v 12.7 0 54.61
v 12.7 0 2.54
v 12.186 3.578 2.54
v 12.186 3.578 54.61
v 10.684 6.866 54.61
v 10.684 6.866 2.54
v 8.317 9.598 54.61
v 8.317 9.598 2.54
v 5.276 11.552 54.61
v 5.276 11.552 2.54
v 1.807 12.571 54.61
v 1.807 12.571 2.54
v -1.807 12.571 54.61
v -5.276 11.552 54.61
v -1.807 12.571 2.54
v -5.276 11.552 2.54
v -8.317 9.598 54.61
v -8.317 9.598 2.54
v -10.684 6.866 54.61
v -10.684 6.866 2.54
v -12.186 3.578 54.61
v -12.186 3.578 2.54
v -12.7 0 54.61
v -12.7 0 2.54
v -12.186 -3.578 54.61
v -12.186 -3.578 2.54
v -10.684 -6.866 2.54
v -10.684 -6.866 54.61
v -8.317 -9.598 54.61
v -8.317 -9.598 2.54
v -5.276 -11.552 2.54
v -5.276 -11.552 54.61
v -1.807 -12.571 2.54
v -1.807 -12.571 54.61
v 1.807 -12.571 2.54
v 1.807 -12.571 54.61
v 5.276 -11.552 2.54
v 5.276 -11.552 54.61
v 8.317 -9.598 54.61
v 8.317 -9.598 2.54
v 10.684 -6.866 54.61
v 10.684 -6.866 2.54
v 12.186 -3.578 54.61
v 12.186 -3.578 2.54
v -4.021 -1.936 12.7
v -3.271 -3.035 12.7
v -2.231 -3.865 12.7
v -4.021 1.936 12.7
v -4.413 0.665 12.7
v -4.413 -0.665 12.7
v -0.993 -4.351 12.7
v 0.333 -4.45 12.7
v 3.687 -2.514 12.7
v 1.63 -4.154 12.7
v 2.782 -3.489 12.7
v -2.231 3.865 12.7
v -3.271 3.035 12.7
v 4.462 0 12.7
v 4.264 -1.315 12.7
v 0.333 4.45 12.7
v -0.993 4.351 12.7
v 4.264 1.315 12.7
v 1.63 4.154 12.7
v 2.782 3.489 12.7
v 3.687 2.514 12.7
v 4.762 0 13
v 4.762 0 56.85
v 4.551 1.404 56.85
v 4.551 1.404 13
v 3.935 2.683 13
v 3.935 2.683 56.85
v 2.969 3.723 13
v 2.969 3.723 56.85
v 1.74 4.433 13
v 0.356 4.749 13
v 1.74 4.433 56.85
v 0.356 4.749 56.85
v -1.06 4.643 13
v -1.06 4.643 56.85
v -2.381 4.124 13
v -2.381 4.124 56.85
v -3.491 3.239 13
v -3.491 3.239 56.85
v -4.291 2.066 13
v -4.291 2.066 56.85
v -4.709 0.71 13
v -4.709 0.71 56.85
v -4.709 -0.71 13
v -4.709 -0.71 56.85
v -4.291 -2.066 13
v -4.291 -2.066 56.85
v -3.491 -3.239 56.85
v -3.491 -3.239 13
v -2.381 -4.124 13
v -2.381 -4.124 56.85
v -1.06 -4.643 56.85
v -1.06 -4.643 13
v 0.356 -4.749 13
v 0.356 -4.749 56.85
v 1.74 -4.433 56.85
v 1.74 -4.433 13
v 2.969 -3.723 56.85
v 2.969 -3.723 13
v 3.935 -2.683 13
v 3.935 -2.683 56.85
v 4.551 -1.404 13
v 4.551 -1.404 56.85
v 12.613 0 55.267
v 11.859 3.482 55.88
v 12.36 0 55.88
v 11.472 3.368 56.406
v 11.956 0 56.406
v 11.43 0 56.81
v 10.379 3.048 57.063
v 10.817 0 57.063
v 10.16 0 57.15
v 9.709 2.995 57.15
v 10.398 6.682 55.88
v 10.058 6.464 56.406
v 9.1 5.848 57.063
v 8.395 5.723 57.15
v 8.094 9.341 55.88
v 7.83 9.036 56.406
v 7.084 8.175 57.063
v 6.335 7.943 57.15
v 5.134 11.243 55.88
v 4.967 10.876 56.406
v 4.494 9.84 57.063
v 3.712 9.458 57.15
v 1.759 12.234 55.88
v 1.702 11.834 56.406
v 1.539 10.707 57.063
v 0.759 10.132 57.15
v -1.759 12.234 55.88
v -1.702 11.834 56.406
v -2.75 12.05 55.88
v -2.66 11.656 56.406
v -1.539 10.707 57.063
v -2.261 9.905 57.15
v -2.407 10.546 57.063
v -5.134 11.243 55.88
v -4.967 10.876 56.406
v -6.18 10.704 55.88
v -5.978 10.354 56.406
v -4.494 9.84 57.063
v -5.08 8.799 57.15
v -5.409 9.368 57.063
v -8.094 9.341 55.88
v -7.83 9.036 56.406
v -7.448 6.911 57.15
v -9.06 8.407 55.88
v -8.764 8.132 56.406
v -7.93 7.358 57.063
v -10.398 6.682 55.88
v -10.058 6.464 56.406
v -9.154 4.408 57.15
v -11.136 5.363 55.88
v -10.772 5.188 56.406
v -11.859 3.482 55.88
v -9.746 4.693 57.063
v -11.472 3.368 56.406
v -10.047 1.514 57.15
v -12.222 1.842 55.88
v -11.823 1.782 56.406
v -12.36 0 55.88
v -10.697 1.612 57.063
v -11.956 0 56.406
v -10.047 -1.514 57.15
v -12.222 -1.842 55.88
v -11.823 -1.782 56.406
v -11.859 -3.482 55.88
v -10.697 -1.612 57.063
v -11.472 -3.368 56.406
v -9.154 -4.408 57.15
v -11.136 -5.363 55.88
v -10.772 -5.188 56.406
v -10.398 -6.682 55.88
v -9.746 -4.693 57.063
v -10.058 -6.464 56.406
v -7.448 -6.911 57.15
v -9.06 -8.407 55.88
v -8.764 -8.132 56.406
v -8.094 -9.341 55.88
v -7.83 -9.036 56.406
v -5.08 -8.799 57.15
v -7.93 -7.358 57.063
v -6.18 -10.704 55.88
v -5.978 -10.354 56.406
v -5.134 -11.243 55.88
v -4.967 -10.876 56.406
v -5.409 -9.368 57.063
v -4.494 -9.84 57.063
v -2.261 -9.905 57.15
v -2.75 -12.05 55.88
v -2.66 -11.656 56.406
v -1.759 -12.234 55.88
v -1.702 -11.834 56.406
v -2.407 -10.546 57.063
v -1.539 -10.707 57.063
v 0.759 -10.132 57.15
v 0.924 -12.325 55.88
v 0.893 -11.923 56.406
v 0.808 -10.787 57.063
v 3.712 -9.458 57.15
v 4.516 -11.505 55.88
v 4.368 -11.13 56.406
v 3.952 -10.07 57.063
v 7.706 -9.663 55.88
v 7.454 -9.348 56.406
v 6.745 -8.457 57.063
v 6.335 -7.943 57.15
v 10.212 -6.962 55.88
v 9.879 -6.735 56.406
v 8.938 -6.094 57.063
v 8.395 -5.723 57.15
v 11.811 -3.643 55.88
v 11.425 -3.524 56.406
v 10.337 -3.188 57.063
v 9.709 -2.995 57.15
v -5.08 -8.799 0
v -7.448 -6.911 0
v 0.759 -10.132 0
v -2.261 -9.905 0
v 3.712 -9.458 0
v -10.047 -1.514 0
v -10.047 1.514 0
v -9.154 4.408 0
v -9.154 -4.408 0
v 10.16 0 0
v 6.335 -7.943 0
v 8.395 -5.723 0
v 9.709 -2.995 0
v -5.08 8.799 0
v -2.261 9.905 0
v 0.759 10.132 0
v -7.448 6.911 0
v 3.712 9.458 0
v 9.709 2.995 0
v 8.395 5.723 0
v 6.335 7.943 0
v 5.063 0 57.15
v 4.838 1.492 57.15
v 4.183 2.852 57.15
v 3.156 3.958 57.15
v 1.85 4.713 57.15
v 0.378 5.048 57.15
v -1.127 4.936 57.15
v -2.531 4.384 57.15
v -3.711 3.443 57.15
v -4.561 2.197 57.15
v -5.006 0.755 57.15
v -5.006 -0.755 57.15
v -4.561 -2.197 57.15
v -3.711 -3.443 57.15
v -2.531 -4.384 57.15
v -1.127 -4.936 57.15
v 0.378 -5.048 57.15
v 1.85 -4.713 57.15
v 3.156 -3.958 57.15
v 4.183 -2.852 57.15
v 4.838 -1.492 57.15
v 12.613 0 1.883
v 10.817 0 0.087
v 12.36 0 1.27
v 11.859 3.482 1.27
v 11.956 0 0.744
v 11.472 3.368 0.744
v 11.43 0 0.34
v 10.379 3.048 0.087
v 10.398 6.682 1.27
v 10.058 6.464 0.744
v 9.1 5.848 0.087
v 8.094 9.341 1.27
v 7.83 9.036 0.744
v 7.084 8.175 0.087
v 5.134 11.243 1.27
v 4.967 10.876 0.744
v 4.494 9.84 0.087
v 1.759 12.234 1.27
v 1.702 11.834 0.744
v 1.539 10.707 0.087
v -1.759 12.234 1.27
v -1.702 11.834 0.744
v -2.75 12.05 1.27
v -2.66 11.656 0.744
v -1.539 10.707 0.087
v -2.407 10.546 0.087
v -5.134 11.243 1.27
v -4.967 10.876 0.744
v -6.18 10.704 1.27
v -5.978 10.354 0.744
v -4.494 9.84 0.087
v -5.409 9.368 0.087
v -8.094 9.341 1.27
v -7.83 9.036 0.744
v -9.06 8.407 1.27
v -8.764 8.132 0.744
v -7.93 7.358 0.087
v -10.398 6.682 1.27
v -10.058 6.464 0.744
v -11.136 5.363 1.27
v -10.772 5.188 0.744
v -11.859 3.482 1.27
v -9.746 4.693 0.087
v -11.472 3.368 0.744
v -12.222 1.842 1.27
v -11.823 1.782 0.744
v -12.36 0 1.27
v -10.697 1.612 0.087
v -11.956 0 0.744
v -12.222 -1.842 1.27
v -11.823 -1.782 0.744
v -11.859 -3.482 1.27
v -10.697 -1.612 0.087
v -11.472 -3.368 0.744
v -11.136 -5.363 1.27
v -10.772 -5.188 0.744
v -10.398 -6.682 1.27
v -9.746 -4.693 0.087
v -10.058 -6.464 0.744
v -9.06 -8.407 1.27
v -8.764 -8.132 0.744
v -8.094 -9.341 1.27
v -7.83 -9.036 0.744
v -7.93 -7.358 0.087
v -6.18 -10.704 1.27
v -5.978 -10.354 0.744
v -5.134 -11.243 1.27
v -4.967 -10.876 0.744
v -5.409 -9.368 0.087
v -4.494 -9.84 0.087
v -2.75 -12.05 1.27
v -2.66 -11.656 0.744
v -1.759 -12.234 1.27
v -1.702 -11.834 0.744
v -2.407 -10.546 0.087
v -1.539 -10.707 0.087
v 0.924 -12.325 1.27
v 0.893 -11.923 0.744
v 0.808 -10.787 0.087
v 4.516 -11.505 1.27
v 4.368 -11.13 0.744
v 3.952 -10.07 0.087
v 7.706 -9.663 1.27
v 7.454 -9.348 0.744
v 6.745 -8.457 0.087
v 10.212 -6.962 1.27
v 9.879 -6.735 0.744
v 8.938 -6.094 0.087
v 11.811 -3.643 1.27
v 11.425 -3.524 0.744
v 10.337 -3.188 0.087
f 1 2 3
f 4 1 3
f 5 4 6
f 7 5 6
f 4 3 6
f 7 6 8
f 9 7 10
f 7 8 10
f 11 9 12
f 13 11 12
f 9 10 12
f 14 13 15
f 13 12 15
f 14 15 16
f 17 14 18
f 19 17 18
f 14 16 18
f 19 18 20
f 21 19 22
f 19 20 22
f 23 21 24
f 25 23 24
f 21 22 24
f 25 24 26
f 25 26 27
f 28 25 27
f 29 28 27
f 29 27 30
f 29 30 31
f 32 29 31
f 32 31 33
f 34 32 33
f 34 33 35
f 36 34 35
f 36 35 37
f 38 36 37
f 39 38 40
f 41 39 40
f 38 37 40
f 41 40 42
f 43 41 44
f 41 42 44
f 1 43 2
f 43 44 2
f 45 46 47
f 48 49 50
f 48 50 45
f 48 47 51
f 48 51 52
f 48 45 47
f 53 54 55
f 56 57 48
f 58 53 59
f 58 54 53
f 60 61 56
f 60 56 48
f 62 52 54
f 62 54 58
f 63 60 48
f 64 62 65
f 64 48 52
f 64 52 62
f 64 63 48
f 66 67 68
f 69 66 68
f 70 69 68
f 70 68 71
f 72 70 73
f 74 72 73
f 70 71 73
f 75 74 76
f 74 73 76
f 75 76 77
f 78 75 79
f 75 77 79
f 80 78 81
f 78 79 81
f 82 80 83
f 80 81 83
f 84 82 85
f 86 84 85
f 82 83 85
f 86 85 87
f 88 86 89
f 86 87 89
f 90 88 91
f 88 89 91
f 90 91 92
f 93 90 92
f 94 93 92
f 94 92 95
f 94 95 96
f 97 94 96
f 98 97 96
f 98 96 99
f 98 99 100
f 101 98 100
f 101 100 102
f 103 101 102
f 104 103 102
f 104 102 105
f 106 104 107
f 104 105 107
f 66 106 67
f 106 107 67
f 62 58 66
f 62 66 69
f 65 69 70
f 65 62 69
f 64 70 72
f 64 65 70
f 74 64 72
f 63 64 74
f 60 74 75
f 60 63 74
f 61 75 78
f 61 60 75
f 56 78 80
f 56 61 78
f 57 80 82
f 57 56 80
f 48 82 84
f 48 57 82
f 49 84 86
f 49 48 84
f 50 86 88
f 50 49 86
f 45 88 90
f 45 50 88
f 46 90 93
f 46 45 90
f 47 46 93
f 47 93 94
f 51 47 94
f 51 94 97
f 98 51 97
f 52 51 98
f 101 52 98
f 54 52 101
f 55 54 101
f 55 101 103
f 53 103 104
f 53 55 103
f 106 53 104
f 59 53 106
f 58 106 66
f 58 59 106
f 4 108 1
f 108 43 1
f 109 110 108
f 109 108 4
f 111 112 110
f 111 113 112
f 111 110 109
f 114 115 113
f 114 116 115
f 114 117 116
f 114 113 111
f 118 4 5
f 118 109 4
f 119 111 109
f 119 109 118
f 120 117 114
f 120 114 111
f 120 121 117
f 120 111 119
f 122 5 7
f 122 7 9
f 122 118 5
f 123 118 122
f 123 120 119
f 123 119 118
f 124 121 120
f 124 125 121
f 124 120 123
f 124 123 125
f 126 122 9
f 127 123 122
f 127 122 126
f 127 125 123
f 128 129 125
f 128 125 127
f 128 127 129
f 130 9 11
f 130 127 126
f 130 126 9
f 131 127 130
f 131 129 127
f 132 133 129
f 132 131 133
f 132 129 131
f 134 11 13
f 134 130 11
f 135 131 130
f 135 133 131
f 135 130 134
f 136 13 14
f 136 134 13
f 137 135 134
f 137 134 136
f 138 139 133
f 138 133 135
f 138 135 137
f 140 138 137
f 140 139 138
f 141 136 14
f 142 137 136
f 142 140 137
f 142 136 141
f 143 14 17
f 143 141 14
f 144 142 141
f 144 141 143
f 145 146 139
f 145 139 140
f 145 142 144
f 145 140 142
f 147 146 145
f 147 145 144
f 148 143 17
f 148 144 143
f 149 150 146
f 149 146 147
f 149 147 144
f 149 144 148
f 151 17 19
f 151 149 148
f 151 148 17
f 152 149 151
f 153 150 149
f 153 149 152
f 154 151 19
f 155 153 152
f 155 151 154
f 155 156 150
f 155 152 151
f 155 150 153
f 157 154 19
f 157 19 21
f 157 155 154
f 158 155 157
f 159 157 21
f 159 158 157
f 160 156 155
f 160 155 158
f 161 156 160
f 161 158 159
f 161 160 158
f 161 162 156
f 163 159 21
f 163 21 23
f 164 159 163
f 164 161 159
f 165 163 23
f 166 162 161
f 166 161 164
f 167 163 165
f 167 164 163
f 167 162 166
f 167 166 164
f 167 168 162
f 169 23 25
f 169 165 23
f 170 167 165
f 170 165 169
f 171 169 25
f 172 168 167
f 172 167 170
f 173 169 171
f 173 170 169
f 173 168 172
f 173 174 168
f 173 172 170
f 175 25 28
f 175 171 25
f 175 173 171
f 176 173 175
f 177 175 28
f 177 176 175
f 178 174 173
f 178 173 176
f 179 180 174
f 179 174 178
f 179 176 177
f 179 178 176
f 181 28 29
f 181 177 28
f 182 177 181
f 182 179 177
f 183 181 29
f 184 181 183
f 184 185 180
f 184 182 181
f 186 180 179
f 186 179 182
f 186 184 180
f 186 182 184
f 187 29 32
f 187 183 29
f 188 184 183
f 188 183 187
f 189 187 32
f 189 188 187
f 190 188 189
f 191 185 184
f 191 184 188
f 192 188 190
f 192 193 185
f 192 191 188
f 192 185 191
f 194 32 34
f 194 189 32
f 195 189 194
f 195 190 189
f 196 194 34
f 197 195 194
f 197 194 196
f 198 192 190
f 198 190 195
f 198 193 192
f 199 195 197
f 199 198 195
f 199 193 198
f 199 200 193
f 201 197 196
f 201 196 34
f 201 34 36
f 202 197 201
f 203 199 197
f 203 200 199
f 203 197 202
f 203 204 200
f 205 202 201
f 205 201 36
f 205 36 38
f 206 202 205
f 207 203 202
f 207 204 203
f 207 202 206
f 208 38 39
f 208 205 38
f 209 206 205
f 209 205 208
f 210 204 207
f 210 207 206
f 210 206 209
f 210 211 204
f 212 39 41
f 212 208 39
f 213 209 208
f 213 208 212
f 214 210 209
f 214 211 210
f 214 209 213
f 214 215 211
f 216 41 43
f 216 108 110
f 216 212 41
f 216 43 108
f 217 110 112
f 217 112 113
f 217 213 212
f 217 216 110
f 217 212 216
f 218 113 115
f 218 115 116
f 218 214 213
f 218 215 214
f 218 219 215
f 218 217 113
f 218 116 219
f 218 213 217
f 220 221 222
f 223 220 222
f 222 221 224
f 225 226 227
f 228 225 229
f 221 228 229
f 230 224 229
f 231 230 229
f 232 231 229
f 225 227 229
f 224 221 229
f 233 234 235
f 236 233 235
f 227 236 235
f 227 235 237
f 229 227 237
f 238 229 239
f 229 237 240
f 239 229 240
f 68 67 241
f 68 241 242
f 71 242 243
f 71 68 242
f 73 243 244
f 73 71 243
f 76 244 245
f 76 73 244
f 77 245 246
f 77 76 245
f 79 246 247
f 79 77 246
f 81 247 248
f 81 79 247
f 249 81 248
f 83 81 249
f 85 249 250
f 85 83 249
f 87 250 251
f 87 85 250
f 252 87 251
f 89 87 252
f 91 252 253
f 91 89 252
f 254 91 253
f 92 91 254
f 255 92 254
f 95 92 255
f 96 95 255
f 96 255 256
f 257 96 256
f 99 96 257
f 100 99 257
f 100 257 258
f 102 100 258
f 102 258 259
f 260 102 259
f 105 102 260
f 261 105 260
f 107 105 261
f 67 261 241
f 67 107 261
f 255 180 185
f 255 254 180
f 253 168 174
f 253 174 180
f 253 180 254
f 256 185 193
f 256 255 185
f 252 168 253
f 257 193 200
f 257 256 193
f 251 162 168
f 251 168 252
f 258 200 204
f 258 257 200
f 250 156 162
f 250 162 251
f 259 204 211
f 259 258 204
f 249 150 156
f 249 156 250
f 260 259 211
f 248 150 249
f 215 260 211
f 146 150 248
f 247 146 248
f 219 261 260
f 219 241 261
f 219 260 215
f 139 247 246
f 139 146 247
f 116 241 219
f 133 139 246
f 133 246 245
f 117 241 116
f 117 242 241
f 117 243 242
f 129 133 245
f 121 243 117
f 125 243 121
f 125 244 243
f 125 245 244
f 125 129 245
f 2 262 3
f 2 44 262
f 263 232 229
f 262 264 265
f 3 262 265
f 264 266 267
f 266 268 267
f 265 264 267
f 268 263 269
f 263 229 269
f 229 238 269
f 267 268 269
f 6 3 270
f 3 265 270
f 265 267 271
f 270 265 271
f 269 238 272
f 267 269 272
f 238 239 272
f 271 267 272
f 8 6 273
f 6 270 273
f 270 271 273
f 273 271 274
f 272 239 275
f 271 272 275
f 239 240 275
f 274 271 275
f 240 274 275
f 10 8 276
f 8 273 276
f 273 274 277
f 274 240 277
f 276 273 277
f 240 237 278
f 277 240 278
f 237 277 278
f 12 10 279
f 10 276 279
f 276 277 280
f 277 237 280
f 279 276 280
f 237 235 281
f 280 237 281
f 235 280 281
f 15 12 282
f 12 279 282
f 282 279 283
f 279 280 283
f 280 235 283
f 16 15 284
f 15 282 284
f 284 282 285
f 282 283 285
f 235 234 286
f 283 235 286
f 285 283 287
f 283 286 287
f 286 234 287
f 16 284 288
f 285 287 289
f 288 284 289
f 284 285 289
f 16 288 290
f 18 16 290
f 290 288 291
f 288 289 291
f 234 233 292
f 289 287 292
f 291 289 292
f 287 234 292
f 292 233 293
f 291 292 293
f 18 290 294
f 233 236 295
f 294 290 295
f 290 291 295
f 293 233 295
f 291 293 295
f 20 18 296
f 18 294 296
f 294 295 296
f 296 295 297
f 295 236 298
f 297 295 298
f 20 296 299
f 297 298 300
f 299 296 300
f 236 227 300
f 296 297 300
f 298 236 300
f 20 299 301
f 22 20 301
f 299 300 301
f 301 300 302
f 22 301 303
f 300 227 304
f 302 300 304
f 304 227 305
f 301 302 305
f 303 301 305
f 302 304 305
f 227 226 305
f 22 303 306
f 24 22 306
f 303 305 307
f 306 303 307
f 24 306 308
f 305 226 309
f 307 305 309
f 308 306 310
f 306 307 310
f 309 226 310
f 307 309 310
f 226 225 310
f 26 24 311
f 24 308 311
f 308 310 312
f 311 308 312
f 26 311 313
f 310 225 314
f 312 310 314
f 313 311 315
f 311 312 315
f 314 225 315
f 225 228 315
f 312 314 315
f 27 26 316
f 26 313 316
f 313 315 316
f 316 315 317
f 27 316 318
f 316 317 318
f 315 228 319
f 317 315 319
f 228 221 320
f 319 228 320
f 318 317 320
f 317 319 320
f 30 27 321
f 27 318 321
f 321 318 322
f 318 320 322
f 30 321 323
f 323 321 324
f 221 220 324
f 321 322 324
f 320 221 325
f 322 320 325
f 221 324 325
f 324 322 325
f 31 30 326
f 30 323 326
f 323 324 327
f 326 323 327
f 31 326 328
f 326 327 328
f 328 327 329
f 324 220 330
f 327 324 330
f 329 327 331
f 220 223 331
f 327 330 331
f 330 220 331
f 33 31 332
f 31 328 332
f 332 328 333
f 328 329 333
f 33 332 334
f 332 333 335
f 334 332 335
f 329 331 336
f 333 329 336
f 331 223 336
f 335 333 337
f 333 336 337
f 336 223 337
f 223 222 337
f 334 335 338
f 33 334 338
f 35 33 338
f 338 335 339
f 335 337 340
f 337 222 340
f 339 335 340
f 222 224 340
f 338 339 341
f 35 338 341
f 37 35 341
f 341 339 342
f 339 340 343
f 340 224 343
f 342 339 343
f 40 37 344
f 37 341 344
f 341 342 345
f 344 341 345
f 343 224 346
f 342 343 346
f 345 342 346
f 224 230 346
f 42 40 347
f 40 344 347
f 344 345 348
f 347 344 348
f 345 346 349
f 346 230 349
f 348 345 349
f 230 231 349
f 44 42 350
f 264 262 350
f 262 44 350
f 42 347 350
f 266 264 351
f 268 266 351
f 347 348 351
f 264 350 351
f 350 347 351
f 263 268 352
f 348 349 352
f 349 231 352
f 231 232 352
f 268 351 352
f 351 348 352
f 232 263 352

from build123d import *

# Parameters (mm, degrees)
F0_R     = 12.7
F1_DEPTH = 57.15
F2_R     = 4.7625
F3_DEPTH = 44.45
F4_R     = 2.54
F5_SIZE  = 0.3


with BuildPart() as f1:
    # F0 (on Top) → F1 (new body)
    with BuildSketch(Plane.XY):
        Circle(F0_R)
    extrude(amount=F1_DEPTH)

    # F2 (on face) → F3 (cut)
    with BuildSketch(Plane.XY.offset(57.15)):
        Circle(F2_R)
    extrude(amount=-F3_DEPTH, mode=Mode.SUBTRACT)

    # F4
    f4_edges = [f1.edges().sort_by_distance(p)[0] for p in [
        (-12.7, 0, 0),
        (-12.7, 0, 57.15),
    ]]
    fillet(f4_edges, radius=F4_R)

    # F5
    f5_edges = [f1.edges().sort_by_distance(p)[0] for p in [
        (-4.7625, 0, 12.7),
        (-10.16, 0, 57.15),
        (-4.7625, 0, 57.15),
    ]]
    chamfer(f5_edges, length=F5_SIZE)


solid = f1.part
